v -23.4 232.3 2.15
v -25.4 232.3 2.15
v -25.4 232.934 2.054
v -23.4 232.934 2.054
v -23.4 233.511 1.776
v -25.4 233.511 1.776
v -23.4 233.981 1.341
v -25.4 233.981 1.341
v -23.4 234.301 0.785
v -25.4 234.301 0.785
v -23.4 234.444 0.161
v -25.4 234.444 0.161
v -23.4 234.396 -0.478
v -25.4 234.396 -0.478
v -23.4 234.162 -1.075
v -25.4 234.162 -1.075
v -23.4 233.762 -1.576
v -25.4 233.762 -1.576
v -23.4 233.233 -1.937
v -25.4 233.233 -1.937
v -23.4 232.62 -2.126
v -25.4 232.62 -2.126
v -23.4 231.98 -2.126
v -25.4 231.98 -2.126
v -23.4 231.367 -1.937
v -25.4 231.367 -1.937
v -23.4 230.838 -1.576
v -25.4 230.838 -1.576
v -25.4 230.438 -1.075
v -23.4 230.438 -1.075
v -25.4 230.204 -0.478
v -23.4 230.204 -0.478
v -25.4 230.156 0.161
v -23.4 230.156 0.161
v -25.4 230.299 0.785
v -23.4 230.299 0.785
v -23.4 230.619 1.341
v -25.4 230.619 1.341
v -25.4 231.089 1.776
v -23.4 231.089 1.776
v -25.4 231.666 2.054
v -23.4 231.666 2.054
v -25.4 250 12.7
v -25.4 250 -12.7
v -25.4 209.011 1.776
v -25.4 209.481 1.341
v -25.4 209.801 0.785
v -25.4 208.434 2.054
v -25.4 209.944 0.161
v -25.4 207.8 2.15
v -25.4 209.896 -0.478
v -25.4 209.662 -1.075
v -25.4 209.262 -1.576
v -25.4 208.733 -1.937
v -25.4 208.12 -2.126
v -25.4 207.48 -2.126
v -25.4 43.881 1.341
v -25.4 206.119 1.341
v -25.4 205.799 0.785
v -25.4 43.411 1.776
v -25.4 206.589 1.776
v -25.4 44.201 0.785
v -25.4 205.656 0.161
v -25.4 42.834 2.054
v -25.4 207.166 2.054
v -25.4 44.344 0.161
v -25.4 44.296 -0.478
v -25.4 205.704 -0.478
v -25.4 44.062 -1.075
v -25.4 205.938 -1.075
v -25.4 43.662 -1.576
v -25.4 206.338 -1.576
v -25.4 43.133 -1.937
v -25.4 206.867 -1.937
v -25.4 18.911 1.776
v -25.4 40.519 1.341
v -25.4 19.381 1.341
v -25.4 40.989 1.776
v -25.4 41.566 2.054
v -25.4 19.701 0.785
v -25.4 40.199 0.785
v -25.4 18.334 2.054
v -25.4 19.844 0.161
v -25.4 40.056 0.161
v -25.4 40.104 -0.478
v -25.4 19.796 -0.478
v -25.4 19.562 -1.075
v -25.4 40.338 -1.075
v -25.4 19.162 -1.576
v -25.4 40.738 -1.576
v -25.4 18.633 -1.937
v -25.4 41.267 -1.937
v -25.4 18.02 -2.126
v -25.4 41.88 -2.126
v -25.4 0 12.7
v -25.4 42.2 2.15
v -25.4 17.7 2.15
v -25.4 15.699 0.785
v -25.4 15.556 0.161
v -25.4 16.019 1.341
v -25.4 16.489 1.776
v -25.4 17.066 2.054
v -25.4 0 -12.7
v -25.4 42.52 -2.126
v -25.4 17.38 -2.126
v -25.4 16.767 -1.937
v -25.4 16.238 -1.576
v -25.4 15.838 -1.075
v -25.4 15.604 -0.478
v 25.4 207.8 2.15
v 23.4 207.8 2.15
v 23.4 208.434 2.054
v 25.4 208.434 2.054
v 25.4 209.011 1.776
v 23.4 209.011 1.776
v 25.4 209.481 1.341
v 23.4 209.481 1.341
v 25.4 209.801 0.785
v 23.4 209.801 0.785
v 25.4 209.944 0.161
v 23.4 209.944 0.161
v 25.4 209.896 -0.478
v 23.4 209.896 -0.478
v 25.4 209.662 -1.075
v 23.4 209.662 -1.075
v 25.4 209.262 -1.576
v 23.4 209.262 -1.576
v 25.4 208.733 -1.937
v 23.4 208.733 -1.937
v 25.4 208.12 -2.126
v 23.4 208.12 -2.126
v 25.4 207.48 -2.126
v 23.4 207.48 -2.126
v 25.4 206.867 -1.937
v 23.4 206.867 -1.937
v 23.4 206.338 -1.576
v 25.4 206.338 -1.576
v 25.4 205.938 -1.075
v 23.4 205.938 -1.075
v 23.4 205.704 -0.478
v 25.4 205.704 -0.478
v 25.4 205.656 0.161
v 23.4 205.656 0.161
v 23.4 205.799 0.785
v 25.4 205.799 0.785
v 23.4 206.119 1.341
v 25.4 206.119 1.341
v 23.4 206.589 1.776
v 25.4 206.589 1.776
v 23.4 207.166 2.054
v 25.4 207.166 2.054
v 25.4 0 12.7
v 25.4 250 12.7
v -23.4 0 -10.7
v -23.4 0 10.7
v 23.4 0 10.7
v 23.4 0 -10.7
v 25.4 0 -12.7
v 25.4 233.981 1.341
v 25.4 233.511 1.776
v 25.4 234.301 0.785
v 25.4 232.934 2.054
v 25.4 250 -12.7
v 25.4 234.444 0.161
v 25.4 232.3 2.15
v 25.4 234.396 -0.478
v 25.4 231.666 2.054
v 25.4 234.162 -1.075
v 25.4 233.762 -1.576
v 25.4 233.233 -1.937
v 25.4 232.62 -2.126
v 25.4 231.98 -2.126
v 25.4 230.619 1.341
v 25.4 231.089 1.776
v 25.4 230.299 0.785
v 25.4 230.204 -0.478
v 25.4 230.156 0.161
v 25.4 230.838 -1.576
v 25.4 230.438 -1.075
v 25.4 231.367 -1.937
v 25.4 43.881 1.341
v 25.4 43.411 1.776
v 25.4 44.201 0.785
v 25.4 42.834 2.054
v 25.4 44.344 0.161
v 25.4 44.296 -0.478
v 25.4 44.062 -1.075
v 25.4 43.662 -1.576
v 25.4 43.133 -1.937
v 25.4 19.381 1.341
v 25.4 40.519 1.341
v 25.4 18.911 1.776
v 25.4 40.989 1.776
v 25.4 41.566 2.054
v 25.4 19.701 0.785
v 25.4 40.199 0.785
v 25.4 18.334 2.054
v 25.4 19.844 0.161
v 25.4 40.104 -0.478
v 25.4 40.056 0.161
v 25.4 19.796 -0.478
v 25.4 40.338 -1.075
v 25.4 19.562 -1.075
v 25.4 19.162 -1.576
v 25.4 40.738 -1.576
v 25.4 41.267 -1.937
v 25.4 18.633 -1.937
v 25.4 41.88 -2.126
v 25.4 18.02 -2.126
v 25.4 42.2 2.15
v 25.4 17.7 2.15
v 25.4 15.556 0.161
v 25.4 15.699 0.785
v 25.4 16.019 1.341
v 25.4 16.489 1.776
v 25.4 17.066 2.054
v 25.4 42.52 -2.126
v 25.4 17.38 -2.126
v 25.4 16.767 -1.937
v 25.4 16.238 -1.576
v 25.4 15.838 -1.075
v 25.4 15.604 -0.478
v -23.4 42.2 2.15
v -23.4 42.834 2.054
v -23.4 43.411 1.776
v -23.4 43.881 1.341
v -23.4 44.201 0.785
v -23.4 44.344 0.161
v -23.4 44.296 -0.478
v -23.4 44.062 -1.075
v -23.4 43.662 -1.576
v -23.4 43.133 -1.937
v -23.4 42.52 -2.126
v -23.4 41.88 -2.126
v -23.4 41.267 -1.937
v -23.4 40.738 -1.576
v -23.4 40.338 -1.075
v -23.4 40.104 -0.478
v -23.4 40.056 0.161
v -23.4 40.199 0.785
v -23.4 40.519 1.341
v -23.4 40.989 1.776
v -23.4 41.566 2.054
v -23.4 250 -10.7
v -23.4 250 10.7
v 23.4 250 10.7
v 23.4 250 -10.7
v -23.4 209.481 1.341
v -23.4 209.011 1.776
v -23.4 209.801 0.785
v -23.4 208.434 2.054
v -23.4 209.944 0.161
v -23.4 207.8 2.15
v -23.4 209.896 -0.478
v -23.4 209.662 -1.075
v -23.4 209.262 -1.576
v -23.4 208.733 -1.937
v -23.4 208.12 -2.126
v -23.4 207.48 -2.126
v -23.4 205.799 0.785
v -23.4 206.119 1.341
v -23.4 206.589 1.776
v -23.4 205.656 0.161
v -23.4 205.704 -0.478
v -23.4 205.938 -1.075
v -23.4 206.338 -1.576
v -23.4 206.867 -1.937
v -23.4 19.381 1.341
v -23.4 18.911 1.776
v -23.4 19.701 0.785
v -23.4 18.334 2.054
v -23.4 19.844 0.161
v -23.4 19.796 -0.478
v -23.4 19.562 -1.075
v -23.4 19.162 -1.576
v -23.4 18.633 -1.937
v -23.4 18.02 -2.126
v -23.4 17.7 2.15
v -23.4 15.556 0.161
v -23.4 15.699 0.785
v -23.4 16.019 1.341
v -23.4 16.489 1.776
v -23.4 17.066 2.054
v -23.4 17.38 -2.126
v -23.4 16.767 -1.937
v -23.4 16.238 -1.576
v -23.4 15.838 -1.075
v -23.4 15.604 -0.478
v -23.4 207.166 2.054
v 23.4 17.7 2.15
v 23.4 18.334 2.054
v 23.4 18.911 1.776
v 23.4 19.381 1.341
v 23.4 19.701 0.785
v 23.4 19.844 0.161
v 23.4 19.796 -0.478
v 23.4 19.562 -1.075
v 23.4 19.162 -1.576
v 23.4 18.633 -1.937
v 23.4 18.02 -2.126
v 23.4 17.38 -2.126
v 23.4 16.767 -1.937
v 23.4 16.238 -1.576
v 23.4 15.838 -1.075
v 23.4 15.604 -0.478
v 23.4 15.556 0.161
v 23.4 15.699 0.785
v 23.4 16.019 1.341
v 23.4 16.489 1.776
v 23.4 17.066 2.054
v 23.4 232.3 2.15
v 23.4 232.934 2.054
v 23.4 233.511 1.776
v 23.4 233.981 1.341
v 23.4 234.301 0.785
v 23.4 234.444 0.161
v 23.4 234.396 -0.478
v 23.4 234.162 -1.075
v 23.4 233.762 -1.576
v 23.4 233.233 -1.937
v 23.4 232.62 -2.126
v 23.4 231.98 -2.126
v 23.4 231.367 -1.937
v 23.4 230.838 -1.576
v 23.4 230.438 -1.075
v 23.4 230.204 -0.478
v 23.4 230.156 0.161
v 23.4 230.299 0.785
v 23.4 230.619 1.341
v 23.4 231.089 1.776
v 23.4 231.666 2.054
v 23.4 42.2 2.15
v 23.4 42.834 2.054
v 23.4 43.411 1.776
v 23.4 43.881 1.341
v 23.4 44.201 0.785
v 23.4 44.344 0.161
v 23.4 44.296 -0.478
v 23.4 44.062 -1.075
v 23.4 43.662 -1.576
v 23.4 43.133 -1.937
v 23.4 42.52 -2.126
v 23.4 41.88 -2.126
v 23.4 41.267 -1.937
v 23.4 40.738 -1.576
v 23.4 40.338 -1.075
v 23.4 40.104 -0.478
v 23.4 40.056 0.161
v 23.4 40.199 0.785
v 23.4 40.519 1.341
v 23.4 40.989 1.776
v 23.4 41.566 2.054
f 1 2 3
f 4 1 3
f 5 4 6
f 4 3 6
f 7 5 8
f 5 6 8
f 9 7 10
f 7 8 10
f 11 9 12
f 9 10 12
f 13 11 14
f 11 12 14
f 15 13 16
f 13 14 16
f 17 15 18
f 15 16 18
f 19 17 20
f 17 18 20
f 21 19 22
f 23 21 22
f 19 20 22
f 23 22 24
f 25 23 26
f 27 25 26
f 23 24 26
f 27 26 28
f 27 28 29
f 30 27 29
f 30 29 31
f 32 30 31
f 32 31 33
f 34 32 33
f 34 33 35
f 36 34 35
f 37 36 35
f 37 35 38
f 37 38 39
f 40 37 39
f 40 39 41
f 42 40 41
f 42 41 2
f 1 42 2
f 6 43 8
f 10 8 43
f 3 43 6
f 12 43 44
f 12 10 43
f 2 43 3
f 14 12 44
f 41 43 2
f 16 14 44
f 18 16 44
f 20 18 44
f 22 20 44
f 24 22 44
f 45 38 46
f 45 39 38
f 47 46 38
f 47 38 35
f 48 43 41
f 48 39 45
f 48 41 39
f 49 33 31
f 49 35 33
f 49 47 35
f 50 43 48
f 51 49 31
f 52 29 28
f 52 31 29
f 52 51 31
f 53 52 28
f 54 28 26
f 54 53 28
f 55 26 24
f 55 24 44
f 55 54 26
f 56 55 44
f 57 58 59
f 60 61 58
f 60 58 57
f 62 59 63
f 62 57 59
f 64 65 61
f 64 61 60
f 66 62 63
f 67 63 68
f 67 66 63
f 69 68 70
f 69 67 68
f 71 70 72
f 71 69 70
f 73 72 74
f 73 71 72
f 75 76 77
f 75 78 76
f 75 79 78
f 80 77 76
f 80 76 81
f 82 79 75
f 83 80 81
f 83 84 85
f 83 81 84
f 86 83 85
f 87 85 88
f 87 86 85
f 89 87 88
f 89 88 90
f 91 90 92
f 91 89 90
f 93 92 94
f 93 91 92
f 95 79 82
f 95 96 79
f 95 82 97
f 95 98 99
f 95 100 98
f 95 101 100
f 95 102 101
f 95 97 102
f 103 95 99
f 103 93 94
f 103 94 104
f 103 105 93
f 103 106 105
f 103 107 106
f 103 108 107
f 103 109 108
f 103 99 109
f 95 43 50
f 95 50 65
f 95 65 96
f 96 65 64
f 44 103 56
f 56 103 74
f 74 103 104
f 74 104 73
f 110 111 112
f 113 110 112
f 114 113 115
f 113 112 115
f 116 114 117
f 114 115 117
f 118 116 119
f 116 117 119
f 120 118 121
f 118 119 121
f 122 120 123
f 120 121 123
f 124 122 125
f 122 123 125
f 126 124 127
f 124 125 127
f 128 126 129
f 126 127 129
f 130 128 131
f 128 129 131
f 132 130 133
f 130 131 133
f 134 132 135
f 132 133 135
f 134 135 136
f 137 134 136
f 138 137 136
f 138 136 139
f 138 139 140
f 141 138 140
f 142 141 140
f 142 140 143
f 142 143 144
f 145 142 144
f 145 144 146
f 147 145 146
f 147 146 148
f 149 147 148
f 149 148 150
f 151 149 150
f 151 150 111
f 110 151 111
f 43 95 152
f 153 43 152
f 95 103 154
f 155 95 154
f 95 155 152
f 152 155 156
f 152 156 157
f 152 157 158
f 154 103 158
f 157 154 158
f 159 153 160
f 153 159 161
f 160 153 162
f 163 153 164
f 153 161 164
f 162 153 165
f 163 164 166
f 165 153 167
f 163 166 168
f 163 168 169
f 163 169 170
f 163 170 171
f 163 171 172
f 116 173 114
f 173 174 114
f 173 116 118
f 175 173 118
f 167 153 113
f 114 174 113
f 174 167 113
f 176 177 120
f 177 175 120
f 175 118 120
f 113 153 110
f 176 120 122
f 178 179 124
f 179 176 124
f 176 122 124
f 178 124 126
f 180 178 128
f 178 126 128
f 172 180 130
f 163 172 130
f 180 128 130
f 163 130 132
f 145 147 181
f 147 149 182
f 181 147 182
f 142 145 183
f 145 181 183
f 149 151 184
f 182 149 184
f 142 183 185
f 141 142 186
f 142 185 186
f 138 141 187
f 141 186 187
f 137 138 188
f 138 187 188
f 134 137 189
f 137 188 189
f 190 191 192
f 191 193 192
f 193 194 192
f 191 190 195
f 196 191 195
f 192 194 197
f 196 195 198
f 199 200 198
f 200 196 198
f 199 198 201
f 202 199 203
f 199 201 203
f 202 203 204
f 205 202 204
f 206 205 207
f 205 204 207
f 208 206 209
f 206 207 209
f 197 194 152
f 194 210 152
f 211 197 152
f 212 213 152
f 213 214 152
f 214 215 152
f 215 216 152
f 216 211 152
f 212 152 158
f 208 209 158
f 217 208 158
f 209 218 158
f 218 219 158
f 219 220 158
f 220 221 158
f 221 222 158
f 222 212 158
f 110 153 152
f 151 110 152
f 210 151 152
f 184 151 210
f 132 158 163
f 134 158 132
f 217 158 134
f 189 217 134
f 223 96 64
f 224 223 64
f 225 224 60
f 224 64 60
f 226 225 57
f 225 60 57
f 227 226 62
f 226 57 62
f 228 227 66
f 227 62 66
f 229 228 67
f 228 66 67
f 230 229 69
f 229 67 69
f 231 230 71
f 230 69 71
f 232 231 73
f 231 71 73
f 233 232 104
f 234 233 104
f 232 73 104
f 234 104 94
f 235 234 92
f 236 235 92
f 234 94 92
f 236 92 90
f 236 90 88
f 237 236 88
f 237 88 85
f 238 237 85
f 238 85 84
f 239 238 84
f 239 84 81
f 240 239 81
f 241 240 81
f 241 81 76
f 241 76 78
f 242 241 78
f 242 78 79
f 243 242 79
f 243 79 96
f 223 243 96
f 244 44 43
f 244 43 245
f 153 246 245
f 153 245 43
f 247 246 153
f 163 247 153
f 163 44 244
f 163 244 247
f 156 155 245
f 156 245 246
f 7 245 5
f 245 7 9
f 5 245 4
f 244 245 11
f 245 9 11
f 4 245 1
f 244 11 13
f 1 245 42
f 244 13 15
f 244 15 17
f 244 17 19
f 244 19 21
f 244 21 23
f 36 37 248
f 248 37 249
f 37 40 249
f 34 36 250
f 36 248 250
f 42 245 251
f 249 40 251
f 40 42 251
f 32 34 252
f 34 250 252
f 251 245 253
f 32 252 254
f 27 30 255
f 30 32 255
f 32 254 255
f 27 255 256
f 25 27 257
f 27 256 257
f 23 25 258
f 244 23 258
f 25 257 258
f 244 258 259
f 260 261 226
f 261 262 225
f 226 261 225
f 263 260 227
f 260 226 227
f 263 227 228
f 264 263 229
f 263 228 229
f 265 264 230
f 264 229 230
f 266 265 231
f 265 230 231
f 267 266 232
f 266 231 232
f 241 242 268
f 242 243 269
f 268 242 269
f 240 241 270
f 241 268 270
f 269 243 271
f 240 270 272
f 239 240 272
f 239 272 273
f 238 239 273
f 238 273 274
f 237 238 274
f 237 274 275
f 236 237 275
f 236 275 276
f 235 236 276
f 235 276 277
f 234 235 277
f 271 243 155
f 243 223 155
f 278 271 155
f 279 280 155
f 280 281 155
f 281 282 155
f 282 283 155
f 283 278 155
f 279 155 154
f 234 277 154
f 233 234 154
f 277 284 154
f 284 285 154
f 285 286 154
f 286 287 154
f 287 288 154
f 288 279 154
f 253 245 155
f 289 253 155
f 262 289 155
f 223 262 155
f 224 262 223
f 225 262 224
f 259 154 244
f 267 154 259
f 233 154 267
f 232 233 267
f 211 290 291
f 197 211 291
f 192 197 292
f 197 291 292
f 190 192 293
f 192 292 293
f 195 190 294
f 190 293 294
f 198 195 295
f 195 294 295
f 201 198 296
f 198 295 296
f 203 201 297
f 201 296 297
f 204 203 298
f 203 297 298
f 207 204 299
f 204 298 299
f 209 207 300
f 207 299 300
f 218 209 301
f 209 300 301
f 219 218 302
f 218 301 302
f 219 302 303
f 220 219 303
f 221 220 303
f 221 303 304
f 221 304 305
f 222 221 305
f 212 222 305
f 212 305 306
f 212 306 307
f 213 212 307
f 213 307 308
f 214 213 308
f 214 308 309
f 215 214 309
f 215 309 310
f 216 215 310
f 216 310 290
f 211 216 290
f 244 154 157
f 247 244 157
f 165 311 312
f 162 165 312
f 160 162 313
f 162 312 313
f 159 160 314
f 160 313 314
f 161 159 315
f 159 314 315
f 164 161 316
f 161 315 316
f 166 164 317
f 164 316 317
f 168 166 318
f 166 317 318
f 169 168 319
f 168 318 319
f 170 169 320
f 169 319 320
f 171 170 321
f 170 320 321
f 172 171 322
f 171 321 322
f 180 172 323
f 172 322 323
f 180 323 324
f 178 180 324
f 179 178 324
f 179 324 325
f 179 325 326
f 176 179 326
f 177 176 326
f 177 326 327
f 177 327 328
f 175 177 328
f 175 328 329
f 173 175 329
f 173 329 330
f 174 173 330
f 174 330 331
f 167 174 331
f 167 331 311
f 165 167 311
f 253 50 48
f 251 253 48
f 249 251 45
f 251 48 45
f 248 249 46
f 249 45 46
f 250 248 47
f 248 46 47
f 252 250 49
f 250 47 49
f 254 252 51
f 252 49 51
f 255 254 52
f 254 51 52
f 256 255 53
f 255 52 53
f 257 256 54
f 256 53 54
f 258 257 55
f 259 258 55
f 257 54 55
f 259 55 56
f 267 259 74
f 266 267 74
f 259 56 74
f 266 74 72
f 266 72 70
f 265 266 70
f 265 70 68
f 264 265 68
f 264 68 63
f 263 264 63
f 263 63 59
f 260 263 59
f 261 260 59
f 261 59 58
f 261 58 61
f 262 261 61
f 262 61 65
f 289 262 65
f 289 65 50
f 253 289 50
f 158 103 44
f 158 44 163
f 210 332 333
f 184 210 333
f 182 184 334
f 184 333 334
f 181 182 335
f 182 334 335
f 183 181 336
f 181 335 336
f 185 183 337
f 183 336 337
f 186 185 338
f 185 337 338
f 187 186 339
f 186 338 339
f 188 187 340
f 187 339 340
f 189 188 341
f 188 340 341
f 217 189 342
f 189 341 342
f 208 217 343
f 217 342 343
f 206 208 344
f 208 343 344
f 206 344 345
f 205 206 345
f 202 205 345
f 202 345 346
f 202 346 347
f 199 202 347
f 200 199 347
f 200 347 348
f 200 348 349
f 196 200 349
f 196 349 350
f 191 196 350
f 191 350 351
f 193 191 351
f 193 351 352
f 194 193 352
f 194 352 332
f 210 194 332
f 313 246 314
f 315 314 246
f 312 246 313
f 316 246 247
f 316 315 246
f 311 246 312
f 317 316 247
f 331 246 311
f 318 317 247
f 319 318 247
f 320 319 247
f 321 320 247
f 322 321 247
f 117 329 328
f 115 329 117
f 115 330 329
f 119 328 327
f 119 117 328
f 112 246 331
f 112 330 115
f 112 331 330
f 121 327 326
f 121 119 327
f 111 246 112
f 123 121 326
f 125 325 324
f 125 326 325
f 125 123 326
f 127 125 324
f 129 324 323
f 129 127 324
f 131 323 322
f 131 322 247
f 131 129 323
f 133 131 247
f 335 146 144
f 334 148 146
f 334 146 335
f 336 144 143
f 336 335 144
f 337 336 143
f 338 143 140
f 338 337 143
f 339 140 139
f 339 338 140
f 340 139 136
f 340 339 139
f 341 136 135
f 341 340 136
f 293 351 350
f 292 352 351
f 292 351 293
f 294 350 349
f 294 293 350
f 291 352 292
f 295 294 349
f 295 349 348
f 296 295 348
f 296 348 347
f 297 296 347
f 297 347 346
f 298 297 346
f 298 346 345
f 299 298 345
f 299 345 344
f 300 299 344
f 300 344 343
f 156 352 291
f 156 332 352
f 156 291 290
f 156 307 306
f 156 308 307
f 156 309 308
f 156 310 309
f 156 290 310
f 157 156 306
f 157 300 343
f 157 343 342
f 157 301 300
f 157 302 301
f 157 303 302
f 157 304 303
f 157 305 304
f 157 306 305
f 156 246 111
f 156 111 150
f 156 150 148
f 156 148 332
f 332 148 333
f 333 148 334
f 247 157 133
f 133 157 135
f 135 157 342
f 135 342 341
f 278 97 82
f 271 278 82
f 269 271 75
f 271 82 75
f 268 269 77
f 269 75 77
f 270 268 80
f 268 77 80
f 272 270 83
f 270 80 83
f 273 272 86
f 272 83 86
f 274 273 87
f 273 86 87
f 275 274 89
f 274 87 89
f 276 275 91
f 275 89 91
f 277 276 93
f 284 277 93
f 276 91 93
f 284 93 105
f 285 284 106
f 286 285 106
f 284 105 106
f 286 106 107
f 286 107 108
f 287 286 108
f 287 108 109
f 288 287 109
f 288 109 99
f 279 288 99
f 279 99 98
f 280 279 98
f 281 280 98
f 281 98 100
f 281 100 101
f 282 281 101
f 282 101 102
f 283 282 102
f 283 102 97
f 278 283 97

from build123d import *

# Parameters (mm, degrees)
SKETCH_5_W          = 50.8
SKETCH_5_H          = 25.4
EXTRUDE_3_DEPTH     = 250
SKETCH_5_7_W        = 46.8
SKETCH_5_7_H        = 21.4
CUT_EXTRUDE_3_DEPTH = 252.607730406
SKETCH_6_R          = 2.150000004
SKETCH_6_R_2        = 2.15
CUT_EXTRUDE_4_DEPTH = 50.8


with BuildPart() as part:
    # 草圖5 → 填料-伸長3 (new body)
    with BuildSketch(Plane(origin=(0, 0, 0), x_dir=(1, 0, 0), z_dir=(0, 1, 0))):
        Rectangle(SKETCH_5_W, SKETCH_5_H)
    extrude(amount=EXTRUDE_3_DEPTH)

    # 草圖5<7> → 除料-伸長3 (cut, through all)
    with BuildSketch(Plane(origin=(0, 0, 0), x_dir=(1, 0, 0), z_dir=(0, 1, 0))):
        Rectangle(SKETCH_5_7_W, SKETCH_5_7_H)
    extrude(amount=CUT_EXTRUDE_3_DEPTH, mode=Mode.SUBTRACT)

    # 草圖6 → 除料-伸長4 (cut)
    with BuildSketch(Plane.ZY.offset(25.4)):
        with Locations((0, 232.300000014)):
            Circle(SKETCH_6_R)
        with Locations((0, 207.800000014)):
            Circle(SKETCH_6_R)
        with Locations((0, 42.2)):
            Circle(SKETCH_6_R_2)
        with Locations((0, 17.7)):
            Circle(SKETCH_6_R_2)
    extrude(amount=-CUT_EXTRUDE_4_DEPTH, mode=Mode.SUBTRACT)


solid = part.part
